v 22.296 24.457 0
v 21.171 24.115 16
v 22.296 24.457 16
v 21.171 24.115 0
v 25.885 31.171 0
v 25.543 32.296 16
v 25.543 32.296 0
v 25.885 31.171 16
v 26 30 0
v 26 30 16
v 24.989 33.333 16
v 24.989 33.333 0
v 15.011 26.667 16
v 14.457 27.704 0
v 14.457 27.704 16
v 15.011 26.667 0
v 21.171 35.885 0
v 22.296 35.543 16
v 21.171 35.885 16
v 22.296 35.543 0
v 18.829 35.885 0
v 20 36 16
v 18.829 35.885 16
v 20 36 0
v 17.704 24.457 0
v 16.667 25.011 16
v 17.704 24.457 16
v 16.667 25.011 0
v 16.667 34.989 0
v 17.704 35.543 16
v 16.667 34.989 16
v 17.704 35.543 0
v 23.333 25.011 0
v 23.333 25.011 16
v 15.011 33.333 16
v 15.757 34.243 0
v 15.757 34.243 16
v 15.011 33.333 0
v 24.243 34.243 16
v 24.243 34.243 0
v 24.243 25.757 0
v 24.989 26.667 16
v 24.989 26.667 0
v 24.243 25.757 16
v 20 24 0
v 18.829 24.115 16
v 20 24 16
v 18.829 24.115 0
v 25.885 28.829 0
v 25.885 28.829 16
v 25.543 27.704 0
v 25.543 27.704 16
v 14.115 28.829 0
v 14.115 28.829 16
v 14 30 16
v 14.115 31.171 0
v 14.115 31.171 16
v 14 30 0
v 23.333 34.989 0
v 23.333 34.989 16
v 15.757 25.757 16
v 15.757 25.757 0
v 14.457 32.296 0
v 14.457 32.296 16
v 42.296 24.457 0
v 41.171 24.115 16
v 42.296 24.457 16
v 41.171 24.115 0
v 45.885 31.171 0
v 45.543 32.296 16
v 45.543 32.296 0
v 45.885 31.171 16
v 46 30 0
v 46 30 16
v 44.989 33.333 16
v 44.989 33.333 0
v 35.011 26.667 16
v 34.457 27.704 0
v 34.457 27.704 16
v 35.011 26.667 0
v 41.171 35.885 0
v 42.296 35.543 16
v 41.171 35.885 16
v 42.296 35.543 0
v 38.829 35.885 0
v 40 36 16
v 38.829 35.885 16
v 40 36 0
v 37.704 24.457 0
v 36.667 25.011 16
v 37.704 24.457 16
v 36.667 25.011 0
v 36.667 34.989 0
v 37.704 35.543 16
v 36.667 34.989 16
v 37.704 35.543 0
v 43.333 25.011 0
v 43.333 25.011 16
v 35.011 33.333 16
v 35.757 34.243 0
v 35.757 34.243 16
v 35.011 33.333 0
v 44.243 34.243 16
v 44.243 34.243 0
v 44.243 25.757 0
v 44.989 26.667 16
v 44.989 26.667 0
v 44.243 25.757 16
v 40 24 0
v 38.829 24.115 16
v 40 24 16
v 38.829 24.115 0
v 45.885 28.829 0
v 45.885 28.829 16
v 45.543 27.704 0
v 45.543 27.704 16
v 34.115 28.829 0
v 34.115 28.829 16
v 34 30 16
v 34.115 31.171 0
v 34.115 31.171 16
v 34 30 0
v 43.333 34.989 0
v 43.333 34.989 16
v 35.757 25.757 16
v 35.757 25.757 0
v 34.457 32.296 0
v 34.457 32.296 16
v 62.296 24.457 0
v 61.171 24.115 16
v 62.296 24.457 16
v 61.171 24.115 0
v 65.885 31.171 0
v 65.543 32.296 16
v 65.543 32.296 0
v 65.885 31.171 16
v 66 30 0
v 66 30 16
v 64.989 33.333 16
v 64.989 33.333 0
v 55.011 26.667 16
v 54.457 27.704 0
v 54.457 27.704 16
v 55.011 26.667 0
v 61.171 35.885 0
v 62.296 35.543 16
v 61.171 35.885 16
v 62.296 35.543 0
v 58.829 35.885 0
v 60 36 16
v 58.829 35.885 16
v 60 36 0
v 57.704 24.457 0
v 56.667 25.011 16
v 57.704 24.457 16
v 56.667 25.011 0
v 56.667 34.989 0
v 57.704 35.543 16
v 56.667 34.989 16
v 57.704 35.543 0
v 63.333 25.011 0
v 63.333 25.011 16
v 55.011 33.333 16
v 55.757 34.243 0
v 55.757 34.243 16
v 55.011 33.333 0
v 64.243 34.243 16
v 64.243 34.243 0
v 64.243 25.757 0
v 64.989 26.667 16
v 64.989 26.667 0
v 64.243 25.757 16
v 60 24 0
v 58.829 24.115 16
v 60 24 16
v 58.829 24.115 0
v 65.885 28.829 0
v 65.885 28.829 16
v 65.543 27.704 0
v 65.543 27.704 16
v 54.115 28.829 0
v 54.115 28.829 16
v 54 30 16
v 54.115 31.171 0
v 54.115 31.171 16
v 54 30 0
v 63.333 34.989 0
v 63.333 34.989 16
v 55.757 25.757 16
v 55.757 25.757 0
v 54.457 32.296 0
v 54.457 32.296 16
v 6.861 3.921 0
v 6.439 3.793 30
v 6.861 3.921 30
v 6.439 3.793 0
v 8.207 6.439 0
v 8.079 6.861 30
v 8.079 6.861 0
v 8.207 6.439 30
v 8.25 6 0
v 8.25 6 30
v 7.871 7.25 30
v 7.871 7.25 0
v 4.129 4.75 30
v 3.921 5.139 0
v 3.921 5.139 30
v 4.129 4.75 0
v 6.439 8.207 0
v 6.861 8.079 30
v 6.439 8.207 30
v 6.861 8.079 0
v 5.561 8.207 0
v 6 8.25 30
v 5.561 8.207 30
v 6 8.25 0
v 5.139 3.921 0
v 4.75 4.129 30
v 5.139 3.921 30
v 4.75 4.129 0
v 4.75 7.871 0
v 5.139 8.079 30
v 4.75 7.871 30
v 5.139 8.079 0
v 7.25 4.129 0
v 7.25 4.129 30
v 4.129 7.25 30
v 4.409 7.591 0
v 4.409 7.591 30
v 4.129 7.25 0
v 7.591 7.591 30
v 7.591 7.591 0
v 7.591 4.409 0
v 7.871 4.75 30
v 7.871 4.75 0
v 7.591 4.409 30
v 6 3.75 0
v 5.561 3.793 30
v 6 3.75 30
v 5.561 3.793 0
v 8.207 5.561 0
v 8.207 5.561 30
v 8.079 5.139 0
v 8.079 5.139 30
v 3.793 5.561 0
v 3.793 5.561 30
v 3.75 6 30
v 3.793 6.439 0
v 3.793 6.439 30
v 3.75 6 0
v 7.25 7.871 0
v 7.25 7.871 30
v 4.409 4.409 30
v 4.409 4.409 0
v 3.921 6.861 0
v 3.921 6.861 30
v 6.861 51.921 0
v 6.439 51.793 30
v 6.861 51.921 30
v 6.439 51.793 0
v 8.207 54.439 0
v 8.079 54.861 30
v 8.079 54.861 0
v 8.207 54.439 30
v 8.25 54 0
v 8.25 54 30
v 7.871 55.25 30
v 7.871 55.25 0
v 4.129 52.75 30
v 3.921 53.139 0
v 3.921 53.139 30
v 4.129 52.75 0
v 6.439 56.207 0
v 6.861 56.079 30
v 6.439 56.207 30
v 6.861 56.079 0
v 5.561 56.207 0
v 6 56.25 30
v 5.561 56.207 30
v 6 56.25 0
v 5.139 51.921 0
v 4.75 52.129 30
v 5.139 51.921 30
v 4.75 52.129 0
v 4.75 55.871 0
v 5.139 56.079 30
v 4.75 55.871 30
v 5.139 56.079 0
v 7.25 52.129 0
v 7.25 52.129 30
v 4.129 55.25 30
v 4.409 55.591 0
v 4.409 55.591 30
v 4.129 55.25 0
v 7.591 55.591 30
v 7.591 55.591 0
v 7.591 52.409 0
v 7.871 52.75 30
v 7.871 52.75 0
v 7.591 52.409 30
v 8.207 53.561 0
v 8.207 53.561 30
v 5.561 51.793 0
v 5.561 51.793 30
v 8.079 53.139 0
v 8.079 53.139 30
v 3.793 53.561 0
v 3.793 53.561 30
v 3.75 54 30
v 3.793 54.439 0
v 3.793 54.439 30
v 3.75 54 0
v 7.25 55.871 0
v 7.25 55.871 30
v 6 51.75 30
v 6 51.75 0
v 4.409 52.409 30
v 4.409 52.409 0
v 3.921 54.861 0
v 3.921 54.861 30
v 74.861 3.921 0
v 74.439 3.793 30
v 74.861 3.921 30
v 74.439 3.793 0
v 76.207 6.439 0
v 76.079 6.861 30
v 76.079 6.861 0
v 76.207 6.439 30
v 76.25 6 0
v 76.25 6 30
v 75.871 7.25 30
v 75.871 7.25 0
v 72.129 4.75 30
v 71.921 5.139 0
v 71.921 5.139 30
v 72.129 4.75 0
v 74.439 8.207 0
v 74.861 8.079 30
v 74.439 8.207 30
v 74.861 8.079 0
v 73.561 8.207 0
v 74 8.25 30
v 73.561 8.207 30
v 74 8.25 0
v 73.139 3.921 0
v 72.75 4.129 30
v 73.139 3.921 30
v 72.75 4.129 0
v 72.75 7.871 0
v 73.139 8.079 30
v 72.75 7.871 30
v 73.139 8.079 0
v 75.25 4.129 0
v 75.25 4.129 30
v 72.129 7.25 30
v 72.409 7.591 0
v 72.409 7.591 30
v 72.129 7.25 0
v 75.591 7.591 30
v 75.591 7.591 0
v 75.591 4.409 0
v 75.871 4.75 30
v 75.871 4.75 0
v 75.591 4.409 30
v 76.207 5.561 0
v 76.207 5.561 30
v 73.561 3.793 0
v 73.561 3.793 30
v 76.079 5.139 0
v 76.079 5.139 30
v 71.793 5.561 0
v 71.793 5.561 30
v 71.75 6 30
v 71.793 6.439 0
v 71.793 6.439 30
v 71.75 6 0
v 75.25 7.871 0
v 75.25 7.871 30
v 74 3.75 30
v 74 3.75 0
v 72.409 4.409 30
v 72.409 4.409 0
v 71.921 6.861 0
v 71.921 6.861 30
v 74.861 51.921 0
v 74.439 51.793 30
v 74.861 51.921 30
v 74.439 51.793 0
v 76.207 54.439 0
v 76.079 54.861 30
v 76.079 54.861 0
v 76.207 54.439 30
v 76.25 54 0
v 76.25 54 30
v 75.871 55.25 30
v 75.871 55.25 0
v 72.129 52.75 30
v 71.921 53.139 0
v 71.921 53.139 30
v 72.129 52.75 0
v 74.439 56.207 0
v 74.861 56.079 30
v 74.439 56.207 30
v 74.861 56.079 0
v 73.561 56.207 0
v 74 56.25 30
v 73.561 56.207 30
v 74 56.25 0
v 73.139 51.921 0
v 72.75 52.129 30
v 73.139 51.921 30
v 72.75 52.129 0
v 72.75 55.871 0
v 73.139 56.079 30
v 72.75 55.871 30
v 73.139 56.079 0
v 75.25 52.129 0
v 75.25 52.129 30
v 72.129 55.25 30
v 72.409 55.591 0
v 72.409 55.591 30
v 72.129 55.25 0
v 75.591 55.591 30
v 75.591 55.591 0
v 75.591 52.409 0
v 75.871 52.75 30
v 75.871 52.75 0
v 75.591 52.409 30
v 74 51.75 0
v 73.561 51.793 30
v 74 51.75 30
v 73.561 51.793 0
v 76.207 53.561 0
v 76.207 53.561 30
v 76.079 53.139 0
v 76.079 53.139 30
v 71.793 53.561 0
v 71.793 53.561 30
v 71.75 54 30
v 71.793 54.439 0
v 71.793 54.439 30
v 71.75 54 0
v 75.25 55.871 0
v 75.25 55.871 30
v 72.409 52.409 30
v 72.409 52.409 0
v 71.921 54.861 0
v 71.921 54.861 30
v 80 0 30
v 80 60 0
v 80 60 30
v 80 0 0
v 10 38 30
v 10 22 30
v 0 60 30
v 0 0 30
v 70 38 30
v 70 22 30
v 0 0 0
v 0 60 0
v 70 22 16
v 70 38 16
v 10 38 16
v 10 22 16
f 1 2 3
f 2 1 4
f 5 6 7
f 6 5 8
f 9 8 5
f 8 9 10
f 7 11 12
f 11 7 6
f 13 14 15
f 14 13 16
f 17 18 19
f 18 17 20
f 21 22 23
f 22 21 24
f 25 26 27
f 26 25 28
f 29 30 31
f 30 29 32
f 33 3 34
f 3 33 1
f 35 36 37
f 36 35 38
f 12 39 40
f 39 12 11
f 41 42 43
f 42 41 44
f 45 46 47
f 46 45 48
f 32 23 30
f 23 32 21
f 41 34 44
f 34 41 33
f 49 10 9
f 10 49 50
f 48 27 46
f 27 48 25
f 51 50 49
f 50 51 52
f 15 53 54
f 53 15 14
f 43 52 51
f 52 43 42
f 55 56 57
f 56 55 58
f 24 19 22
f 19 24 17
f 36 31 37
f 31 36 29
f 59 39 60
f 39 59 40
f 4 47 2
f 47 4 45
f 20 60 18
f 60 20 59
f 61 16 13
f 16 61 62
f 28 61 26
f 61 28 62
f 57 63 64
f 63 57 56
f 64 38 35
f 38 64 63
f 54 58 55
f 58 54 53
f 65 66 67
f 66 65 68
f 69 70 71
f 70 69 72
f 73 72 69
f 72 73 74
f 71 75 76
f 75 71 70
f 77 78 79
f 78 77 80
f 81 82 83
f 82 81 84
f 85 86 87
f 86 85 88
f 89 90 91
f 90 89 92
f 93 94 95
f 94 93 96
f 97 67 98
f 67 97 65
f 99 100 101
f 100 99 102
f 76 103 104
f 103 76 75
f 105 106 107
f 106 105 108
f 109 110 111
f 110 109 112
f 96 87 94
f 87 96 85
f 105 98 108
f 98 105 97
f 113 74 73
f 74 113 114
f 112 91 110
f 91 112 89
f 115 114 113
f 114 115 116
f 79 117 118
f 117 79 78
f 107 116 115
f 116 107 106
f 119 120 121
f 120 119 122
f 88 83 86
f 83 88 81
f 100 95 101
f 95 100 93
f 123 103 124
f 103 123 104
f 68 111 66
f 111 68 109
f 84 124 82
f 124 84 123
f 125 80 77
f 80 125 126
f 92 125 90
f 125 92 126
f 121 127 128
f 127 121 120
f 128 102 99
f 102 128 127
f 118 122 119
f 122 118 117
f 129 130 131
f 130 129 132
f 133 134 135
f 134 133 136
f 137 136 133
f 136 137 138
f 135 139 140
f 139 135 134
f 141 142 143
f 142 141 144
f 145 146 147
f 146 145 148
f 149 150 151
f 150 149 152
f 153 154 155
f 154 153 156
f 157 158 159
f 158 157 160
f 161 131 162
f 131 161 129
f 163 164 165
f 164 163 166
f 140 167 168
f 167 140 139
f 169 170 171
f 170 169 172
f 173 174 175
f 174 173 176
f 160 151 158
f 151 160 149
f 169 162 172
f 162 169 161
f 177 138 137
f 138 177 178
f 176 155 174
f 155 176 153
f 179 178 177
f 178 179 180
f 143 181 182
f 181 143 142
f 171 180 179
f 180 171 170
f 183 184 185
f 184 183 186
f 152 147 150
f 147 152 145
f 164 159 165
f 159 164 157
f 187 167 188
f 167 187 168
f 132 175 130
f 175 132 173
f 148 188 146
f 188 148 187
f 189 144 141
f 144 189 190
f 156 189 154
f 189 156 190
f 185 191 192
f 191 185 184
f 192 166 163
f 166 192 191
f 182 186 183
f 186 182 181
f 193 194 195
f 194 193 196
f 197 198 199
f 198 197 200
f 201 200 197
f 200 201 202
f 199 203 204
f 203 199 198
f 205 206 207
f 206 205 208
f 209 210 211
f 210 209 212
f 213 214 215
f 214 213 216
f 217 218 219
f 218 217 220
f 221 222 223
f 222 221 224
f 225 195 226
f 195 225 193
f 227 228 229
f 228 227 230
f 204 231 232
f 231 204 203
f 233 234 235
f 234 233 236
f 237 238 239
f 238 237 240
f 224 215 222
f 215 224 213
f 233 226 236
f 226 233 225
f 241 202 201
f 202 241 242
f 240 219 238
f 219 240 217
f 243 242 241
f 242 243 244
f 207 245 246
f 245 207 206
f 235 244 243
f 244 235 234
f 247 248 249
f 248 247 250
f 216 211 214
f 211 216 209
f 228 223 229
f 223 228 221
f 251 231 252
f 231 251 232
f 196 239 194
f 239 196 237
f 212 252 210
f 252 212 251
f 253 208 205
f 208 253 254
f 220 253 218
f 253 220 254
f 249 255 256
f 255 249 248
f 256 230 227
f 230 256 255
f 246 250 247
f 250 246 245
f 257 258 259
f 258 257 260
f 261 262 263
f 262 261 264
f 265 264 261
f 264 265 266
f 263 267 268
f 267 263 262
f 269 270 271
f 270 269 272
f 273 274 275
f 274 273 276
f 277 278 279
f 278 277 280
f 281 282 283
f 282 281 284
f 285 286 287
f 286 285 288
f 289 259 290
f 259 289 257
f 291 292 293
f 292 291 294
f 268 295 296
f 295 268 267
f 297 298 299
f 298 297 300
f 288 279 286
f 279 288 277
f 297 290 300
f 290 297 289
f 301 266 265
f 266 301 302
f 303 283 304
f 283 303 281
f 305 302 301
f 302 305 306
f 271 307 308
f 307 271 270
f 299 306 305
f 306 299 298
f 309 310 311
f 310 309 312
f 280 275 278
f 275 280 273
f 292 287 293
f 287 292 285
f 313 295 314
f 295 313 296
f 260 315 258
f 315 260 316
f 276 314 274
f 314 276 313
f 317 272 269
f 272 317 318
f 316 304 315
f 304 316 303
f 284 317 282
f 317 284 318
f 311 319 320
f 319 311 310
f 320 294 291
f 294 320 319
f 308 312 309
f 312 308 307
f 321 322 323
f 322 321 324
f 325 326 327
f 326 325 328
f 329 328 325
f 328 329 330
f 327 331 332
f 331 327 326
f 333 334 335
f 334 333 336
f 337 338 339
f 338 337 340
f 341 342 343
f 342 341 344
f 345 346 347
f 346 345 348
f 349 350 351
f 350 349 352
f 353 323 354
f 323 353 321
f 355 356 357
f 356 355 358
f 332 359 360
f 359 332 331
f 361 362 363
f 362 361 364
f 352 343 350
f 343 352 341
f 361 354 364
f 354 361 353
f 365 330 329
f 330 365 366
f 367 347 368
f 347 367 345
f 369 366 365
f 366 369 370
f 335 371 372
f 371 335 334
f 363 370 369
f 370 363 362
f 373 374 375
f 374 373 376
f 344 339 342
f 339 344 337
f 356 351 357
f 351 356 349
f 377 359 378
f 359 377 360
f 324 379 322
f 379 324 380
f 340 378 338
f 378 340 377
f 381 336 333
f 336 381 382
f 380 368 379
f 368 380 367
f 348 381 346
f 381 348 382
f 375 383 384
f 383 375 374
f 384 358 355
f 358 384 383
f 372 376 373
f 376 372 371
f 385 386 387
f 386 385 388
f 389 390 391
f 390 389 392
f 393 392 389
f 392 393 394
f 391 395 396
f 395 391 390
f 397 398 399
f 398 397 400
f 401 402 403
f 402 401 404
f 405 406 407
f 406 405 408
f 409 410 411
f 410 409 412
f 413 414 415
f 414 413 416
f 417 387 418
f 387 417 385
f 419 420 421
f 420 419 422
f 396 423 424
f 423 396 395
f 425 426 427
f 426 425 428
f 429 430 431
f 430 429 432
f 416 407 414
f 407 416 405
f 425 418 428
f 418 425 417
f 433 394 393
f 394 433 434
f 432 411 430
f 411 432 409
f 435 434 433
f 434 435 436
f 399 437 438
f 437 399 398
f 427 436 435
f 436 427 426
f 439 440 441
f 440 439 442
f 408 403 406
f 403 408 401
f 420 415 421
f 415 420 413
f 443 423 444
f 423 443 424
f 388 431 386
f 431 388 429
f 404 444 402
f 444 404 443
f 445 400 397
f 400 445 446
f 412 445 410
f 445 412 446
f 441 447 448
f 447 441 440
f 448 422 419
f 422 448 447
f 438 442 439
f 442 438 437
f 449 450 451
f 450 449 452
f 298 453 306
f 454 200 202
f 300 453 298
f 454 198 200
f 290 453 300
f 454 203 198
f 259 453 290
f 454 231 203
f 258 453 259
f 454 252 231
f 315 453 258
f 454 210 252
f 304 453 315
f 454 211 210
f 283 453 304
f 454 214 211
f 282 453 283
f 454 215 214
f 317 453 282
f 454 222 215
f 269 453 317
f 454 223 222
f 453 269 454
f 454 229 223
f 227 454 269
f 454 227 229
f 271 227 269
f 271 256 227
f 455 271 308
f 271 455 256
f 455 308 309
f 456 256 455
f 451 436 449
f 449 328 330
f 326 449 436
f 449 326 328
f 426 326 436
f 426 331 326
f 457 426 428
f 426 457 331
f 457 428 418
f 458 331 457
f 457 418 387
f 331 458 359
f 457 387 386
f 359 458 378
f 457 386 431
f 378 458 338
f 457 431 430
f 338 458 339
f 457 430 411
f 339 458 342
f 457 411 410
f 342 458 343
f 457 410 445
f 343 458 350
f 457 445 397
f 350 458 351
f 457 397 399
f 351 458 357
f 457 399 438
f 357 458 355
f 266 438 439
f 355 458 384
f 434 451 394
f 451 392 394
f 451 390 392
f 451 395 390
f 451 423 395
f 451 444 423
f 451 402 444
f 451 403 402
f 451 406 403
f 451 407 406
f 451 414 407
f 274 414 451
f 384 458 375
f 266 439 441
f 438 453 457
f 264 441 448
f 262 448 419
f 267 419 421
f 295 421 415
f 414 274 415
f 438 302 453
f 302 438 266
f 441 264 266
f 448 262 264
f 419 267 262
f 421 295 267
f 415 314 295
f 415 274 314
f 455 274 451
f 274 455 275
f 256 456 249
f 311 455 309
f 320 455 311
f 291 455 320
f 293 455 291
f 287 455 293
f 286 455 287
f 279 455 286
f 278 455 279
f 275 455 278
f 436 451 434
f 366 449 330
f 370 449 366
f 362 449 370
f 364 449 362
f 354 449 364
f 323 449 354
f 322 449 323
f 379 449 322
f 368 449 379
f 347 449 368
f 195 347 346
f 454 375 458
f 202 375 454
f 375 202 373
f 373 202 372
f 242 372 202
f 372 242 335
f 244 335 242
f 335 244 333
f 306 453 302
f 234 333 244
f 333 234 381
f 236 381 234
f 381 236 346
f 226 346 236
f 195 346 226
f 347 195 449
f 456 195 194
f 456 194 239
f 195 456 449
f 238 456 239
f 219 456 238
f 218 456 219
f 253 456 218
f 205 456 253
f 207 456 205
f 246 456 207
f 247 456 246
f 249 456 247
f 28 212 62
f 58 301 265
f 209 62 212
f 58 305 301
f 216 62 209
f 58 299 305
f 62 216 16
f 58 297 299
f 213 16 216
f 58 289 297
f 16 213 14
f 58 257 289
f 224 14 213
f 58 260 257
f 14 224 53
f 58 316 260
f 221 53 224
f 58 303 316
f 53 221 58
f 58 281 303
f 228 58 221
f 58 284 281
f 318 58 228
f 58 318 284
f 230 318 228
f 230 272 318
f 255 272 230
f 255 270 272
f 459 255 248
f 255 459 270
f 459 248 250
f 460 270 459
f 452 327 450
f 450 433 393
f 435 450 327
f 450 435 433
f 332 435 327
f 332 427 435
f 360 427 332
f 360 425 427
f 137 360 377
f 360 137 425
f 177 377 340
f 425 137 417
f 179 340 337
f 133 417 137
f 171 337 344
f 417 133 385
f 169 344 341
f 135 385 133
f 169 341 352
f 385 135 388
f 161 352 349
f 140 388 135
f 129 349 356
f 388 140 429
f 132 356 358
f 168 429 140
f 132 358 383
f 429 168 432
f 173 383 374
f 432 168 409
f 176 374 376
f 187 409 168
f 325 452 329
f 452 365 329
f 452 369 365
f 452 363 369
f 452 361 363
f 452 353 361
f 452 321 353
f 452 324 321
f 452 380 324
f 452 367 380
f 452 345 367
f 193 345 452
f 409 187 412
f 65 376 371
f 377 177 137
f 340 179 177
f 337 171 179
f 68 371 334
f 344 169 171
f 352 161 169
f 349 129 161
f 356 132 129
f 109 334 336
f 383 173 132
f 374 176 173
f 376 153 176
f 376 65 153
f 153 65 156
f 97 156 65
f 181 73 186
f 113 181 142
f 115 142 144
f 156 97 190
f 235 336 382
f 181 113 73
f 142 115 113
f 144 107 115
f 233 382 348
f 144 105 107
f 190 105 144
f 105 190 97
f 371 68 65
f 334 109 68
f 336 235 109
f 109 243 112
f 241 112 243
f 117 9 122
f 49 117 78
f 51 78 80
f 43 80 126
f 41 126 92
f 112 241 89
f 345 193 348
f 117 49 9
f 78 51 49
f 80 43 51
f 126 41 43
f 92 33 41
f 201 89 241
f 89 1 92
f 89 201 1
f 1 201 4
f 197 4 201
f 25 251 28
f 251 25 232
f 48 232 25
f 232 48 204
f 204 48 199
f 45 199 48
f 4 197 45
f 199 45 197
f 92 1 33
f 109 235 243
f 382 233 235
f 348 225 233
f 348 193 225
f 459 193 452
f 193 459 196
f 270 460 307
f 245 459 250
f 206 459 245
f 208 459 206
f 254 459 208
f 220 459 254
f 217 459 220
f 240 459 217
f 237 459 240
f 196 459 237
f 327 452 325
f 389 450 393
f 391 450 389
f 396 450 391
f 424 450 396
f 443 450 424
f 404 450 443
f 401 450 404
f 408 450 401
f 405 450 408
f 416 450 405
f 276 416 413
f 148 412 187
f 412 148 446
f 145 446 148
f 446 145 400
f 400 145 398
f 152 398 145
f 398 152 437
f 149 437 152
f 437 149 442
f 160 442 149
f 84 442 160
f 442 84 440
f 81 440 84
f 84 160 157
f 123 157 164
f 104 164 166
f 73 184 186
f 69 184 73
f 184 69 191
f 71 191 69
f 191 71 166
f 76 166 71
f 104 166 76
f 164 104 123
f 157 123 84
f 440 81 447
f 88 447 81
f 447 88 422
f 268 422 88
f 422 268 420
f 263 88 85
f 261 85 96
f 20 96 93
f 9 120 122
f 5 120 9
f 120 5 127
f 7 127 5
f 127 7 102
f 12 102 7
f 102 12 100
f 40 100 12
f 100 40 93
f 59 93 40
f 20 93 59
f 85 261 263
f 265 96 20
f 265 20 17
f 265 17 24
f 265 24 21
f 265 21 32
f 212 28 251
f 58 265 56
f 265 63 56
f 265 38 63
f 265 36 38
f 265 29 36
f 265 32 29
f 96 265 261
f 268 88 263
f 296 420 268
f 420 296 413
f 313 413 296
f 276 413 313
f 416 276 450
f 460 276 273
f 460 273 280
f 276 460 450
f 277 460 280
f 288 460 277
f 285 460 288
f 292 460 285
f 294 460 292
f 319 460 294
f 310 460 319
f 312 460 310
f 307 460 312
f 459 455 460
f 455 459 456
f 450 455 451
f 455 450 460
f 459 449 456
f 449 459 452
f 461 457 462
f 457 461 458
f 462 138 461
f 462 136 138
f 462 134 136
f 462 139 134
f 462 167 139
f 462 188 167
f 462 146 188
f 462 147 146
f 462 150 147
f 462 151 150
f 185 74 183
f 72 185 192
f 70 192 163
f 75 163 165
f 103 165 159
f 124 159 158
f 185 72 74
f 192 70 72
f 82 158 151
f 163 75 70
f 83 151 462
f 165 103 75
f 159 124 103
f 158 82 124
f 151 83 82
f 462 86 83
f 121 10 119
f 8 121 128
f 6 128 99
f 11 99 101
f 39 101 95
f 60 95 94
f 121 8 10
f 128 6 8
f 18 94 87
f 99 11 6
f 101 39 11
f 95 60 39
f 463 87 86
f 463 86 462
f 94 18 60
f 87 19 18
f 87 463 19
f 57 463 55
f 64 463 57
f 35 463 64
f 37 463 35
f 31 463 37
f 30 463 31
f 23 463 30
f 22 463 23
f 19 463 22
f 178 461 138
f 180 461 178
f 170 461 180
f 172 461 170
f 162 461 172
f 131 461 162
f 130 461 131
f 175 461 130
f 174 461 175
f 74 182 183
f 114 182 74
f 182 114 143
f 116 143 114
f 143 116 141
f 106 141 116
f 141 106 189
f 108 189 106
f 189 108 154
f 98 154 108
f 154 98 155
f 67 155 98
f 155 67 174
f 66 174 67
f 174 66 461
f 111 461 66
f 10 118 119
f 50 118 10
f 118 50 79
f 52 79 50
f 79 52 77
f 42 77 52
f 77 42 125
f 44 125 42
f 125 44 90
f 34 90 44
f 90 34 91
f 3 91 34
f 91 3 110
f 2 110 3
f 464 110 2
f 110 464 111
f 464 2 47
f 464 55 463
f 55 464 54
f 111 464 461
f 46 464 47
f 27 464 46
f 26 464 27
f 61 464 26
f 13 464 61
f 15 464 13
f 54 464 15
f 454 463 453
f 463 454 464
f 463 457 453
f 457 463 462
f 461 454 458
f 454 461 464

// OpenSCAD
$fn = 32;

// ----------------------------------------------------------------------
// Manifold block: gallery_top manifold
// ----------------------------------------------------------------------

// --- parameters (mm) ---
block_l = 80;             // block length, X
block_w = 60;             // block width, Y
block_h = 30;             // block height, Z
port_d = 12;              // port bore diameter
port_pitch = 20;          // port pitch along X
gallery_d = 16;           // top gallery width, Y
gallery_depth = 14;       // gallery pocket depth
wall_p = 10;              // gallery end wall thickness, X
mnt_d = 4.5;              // mounting hole diameter
mnt_in = 6;               // mounting hole inset from the edges

n_ports = 3;  // ports in the row
port_x0 = (block_l - (n_ports - 1) * port_pitch) / 2;  // first port X

difference() {
  cube([block_l, block_w, block_h]);
  for (i = [0 : n_ports - 1])
    translate([port_x0 + i * port_pitch, block_w / 2, -1])
      cylinder(h = block_h + 2, d = port_d);
  translate([wall_p, block_w / 2 - gallery_d / 2, block_h - gallery_depth])
    cube([block_l - 2 * wall_p, gallery_d, gallery_depth + 1]);
  for (cx = [mnt_in, block_l - mnt_in])
    for (cy = [mnt_in, block_w - mnt_in])
      translate([cx, cy, -1]) cylinder(h = block_h + 2, d = mnt_d);
}
